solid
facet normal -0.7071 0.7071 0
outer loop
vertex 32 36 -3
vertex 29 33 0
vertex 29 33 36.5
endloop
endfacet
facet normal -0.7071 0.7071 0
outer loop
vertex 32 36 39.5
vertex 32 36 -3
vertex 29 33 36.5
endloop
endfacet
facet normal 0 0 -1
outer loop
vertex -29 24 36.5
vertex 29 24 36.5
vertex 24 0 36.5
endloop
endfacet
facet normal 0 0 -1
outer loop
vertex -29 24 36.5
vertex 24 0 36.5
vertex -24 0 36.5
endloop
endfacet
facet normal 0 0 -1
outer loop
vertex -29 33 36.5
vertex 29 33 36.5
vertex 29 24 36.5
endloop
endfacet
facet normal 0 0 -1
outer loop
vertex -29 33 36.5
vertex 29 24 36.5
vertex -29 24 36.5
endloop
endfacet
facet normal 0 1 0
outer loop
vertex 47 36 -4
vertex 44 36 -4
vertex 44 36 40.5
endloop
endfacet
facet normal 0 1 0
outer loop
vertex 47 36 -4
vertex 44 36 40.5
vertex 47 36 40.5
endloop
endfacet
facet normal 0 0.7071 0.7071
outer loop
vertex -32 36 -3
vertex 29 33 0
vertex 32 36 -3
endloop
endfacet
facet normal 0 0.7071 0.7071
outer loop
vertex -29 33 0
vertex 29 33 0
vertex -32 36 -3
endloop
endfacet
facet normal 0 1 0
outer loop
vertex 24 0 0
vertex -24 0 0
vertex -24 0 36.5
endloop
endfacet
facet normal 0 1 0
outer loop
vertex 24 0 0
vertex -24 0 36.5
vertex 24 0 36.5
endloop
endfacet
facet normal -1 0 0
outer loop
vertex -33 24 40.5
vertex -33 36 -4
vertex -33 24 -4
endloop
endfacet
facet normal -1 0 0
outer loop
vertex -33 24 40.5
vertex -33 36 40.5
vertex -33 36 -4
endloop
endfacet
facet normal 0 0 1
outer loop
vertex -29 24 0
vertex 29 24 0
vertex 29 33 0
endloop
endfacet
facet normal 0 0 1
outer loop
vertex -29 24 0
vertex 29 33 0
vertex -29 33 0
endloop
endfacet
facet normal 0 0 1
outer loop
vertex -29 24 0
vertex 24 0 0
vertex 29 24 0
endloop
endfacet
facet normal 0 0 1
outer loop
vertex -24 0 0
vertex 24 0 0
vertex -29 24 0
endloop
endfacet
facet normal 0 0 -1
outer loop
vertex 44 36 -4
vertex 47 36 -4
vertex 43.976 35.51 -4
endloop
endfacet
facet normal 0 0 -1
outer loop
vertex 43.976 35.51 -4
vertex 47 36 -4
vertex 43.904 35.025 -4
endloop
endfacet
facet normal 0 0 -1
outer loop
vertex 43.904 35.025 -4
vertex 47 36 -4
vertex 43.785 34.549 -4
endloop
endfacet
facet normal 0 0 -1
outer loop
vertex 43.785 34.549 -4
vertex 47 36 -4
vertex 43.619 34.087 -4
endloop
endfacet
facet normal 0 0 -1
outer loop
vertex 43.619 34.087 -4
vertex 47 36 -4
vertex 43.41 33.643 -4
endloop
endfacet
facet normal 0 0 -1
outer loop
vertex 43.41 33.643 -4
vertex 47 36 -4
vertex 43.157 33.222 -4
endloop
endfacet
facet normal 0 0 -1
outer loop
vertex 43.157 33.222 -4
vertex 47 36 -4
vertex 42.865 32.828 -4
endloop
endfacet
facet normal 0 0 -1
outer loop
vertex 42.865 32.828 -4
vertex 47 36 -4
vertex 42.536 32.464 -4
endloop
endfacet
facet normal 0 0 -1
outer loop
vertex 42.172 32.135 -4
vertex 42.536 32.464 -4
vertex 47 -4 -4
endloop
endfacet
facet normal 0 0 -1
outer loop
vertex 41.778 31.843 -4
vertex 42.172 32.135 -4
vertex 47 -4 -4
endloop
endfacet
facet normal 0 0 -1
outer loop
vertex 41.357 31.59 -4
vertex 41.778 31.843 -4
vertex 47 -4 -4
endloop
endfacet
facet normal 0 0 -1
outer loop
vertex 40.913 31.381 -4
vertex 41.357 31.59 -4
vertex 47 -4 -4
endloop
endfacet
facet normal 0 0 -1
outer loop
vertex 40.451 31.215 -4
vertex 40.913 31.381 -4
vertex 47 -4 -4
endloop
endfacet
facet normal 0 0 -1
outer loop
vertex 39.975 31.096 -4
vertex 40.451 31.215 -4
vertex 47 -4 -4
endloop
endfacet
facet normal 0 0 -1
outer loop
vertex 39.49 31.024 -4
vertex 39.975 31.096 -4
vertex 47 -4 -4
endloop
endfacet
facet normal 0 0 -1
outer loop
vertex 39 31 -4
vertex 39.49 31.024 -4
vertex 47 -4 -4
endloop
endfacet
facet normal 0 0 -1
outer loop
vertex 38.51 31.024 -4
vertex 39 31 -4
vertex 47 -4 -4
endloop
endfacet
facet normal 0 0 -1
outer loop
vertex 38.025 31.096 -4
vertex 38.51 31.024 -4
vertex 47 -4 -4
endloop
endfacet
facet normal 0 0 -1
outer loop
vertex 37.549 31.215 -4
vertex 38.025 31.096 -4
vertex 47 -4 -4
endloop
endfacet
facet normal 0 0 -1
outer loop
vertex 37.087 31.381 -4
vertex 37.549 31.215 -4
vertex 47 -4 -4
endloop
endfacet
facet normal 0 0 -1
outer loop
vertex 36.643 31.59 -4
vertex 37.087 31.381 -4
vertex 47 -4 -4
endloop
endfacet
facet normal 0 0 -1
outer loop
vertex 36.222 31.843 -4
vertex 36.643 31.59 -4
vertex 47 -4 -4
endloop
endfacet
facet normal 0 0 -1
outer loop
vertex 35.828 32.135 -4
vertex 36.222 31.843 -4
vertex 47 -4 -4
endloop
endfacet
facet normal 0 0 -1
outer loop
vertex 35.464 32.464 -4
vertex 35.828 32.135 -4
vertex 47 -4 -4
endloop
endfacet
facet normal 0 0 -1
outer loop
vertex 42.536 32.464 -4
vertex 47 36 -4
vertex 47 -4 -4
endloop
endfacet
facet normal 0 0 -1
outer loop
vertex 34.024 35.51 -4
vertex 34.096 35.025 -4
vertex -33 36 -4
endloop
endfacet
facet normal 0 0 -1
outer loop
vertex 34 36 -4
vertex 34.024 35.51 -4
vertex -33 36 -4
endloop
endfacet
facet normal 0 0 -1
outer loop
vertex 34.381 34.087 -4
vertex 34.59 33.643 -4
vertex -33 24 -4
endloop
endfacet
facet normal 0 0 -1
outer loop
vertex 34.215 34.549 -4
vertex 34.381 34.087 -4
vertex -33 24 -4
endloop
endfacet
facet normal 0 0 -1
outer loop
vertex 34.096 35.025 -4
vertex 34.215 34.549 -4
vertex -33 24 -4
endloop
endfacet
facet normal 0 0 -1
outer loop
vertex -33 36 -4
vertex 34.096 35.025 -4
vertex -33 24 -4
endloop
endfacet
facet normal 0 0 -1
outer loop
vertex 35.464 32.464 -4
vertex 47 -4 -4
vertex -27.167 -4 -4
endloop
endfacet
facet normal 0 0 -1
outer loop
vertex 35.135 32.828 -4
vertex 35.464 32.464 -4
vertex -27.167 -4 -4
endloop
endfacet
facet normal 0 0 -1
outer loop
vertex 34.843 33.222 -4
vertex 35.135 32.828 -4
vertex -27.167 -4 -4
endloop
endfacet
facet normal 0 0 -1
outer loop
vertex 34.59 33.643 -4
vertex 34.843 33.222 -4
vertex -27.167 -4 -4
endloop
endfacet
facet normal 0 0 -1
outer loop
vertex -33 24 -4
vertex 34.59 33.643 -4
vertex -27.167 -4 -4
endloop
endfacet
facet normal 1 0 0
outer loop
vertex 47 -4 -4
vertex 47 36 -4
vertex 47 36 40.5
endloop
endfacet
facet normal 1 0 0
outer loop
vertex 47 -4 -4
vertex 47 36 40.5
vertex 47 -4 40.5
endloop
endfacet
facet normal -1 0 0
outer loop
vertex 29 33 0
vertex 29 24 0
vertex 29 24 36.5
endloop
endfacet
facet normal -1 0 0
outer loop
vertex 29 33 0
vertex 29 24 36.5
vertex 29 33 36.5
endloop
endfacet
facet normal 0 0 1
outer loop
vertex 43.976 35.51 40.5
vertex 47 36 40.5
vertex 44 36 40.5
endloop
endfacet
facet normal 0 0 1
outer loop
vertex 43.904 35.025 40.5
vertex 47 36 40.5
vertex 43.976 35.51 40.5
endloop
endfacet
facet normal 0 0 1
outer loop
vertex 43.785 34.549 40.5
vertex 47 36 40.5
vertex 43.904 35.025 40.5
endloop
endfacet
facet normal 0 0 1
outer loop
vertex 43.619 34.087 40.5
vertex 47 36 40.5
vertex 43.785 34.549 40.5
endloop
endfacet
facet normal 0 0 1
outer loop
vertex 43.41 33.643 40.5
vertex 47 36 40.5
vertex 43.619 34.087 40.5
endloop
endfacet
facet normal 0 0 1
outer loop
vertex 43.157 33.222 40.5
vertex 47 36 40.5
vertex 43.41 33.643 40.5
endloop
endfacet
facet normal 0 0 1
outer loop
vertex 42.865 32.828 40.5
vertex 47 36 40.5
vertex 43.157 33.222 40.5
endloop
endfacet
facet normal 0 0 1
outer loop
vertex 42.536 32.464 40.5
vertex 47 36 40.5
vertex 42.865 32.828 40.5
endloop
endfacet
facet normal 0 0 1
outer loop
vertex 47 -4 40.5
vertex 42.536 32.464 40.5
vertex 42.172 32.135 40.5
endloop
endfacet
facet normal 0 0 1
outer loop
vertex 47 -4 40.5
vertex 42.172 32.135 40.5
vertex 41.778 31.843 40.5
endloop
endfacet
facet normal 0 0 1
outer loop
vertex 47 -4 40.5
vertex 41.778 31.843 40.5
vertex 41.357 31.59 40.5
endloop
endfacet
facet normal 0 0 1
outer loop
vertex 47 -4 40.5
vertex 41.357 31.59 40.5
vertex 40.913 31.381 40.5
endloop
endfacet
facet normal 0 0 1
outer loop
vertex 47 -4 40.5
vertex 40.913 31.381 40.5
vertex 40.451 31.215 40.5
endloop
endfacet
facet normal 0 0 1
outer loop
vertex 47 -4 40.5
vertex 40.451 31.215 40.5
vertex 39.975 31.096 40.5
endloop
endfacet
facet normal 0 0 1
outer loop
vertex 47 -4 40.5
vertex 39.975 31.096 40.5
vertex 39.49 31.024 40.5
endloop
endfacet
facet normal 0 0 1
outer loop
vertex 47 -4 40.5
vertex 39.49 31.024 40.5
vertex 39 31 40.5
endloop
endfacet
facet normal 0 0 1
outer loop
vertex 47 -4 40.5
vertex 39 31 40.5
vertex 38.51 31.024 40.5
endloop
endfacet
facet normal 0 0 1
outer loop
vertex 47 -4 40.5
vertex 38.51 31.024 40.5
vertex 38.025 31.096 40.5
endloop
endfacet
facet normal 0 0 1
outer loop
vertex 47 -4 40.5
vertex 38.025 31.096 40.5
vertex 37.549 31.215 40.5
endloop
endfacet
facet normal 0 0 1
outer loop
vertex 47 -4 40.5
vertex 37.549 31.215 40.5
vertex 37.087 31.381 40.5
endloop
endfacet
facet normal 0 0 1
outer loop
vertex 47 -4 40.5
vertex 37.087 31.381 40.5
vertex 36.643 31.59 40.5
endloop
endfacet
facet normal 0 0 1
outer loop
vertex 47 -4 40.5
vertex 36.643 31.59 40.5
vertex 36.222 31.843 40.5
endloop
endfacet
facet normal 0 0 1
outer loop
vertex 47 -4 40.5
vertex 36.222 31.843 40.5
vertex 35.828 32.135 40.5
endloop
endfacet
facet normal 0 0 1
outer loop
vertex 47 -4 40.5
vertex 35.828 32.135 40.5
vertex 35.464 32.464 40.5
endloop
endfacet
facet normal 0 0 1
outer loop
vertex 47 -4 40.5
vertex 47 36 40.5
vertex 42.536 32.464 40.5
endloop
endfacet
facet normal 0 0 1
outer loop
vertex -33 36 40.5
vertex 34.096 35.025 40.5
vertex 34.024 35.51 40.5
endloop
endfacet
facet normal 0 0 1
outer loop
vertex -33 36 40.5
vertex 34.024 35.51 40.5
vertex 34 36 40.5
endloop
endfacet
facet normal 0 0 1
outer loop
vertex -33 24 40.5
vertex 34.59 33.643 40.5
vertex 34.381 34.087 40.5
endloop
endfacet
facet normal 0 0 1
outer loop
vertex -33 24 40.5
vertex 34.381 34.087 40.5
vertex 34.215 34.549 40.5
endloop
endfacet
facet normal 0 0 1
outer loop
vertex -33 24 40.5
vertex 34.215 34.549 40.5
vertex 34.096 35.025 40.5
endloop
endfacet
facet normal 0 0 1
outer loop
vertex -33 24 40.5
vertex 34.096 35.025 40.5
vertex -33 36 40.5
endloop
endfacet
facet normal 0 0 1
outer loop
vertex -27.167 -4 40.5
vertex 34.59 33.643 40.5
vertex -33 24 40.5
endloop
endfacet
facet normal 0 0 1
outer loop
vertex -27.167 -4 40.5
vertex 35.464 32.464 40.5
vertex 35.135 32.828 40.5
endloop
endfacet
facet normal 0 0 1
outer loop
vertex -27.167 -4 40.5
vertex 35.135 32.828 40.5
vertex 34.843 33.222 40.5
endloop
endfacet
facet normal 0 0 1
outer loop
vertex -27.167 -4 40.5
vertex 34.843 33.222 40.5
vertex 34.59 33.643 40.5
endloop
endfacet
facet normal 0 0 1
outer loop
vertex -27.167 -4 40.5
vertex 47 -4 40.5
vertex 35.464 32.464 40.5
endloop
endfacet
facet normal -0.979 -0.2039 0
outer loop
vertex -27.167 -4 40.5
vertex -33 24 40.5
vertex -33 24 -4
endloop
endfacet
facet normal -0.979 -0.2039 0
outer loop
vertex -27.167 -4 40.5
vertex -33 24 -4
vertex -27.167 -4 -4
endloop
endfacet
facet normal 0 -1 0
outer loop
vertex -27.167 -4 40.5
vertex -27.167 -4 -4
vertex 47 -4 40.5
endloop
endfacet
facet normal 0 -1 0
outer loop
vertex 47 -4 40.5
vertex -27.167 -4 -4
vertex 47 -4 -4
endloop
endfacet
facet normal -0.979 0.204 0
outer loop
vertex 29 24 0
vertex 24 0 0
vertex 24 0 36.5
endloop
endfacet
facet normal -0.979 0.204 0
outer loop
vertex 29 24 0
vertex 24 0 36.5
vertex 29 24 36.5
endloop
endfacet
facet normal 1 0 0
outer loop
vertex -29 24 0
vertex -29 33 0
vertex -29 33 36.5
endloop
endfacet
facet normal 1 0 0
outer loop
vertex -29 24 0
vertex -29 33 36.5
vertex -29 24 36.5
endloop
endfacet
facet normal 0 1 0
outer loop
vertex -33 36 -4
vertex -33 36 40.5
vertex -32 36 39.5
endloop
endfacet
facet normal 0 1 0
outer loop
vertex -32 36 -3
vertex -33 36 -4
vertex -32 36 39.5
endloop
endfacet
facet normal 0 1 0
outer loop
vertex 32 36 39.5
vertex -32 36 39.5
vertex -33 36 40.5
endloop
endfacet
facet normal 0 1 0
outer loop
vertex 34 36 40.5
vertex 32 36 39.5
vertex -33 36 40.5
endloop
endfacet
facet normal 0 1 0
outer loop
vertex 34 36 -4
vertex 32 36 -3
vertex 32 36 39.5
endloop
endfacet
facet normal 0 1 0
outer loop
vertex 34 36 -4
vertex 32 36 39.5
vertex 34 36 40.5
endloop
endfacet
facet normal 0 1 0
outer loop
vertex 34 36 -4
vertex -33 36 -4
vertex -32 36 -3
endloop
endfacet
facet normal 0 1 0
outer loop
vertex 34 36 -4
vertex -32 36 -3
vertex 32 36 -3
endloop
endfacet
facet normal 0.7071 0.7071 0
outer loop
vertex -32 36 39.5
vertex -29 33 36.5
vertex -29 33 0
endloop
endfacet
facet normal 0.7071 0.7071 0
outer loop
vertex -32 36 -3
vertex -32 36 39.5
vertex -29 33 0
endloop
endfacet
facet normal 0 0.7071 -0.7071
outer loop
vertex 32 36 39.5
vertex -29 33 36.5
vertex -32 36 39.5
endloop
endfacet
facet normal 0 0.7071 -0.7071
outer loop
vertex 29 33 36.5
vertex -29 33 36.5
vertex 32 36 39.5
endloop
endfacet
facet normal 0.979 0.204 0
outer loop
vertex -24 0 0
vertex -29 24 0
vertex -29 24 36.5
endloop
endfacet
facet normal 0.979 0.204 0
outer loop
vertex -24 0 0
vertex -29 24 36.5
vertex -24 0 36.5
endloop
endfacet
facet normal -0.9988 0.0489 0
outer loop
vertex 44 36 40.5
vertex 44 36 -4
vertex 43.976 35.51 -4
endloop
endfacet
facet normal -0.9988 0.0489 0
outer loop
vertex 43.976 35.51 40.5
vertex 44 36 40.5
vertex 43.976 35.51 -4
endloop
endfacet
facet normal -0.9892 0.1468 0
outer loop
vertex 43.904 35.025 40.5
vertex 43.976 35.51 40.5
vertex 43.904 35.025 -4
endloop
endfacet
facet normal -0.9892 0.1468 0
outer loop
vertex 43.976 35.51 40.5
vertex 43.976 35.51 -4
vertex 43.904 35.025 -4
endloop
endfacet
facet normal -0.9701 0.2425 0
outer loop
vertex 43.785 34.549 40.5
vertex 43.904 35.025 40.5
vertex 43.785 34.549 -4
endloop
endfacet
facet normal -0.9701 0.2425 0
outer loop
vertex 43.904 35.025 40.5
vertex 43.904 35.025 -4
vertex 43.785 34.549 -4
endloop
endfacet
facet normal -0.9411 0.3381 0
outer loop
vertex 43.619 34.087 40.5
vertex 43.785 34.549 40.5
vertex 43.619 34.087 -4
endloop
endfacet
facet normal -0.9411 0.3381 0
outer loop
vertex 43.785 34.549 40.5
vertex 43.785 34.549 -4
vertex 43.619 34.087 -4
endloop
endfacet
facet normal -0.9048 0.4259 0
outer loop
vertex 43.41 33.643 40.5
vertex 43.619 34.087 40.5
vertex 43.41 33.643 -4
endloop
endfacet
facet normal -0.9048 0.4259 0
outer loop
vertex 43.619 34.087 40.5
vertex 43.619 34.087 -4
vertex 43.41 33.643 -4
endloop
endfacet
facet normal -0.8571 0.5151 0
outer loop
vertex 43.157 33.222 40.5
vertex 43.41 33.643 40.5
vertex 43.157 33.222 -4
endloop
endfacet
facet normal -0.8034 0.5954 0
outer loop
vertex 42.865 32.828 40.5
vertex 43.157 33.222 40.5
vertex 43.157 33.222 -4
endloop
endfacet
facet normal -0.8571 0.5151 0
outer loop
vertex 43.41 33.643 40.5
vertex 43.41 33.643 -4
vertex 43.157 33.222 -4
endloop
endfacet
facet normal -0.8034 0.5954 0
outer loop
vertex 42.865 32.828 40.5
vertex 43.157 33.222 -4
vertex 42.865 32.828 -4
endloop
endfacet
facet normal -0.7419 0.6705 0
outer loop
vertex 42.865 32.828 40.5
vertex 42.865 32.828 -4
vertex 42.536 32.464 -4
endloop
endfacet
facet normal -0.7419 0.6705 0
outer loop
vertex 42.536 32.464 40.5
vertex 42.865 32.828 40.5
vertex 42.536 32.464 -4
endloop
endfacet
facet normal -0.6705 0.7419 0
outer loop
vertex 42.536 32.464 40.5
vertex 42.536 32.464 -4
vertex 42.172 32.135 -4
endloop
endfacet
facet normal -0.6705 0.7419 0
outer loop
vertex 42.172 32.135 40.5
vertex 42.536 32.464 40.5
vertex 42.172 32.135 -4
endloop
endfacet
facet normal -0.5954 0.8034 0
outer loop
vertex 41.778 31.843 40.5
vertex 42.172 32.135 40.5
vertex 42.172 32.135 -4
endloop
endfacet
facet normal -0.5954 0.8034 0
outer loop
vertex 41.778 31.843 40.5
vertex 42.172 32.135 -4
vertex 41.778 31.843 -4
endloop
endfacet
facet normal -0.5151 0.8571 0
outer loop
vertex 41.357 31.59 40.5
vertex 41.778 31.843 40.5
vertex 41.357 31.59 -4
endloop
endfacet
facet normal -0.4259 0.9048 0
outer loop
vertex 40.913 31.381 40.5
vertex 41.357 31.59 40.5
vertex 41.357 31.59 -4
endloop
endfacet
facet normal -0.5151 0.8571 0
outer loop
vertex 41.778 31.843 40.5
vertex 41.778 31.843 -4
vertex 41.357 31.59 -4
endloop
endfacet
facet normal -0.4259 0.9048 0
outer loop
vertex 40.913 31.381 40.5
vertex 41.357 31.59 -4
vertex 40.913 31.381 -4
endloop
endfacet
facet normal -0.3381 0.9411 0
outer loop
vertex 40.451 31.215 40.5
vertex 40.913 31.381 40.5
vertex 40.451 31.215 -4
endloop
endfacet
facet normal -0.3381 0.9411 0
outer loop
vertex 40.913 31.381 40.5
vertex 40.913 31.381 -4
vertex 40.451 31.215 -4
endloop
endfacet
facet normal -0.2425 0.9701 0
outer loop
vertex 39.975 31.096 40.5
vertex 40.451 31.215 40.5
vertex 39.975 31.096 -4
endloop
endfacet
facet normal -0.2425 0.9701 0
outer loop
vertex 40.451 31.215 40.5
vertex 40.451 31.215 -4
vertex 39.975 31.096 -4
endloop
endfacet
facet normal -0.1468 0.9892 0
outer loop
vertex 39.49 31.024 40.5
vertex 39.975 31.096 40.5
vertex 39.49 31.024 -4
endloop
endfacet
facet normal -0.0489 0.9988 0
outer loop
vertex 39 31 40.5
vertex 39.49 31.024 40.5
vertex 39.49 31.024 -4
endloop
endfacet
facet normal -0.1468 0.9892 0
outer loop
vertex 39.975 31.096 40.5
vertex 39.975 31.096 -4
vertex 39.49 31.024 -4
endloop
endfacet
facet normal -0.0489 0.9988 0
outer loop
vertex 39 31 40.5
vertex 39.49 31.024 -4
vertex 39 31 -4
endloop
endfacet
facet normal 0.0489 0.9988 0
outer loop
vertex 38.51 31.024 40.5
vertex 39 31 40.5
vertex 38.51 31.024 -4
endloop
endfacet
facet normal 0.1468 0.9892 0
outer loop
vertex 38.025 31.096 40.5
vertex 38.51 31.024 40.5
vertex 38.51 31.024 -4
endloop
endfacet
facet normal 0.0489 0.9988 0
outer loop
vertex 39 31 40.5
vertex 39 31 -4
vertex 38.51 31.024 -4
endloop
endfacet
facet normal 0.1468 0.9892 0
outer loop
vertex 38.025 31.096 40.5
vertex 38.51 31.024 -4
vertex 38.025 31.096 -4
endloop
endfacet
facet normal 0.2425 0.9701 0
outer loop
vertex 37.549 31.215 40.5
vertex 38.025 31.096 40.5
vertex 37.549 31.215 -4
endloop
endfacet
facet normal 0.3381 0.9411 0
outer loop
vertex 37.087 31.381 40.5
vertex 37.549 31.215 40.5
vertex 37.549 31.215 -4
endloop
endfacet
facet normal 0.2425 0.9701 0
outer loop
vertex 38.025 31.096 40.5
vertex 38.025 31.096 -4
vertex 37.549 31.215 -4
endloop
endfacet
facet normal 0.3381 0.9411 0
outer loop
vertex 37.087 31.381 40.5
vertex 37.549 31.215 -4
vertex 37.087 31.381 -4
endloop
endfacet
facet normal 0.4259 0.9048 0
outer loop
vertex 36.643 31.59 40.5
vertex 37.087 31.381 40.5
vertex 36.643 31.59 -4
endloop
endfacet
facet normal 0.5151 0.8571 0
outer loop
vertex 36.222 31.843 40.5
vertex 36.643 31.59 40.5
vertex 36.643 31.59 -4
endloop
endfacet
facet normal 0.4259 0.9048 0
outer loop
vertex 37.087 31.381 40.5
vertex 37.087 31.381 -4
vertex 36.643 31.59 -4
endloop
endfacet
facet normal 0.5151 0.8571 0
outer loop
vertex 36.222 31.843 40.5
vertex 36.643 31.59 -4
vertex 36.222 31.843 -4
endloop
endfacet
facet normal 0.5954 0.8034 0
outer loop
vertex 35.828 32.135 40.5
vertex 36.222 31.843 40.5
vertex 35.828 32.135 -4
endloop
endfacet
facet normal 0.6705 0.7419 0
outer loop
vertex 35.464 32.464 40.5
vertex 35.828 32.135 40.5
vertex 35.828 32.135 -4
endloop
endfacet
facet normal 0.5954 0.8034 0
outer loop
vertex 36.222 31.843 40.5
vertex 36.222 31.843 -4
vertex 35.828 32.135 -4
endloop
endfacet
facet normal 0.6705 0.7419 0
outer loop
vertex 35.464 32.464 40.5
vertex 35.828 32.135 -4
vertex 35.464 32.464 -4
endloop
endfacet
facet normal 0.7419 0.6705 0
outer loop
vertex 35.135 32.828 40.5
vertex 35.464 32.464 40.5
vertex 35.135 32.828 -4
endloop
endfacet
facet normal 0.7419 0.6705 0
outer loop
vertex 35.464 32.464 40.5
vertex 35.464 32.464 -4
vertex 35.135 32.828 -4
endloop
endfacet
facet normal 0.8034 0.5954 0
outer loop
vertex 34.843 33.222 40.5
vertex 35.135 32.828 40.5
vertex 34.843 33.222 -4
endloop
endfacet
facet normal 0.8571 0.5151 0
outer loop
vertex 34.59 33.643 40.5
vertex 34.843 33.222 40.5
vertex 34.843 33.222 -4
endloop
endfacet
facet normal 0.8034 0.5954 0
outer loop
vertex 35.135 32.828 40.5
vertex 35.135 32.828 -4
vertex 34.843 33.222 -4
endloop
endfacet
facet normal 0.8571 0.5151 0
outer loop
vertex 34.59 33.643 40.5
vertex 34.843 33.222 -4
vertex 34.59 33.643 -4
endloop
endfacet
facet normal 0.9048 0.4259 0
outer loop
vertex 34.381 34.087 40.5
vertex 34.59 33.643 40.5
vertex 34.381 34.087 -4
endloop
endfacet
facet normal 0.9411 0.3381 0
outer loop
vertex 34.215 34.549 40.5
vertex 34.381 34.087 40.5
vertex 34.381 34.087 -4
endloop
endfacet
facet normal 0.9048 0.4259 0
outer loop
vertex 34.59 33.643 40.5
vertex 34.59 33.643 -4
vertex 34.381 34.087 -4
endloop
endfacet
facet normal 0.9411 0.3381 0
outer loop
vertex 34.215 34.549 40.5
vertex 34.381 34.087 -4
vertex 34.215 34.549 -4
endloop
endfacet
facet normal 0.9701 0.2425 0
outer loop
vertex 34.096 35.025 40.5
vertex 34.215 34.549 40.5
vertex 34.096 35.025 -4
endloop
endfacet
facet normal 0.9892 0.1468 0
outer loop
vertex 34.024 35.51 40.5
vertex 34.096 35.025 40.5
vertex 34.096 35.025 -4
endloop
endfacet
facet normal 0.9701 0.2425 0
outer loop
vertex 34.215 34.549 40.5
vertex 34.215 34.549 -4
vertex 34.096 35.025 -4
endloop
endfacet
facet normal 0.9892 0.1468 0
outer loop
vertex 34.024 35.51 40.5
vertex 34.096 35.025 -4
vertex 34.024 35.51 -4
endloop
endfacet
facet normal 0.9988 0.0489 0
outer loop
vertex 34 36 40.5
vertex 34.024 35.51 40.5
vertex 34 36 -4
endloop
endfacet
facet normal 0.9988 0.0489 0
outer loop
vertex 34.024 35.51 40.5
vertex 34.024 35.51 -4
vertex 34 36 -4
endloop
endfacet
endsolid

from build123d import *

# Parameters (mm, degrees)
EXTRUDE001_DEPTH = 4
EXTRUDE002_DEPTH = 4
EXTRUDE003_DEPTH = 44.5
EXTRUDE_DEPTH    = 36.5
CHAMFER_SIZE     = 3
CHAMFER001_SIZE  = 3
CHAMFER002_SIZE  = 3
CHAMFER003_SIZE  = 3


with BuildPart() as extrude001:
    # Sketch001 (on Face14 of Extrude) → Extrude001 (new body)
    with BuildSketch(Plane.XY.offset(36.5)):
        Polygon((-33, 36), (33, 36), (33, 24), (27.166667, -4), (-27.166667, -4), (-33, 24), align=None)
    extrude(amount=EXTRUDE001_DEPTH)


with BuildPart() as extrude002:
    # Sketch002 (on Face13 of Extrude) → Extrude002 (new body)
    with BuildSketch(Plane(origin=(0, 0, 0), x_dir=(1, 0, 0), z_dir=(0, 0, -1))):
        Polygon((-33, -36), (-33, -24), (-27.166667, 4), (27.166667, 4), (33, -24), (33, -36), align=None)
    extrude(amount=EXTRUDE002_DEPTH)


with BuildPart() as extrude003:
    # Sketch003 (on Face8 of Extrude002) → Extrude003 (new body)
    with BuildSketch(Plane(origin=(0, 0, -4), x_dir=(1, 0, 0), z_dir=(0, 0, -1))):
        with BuildLine():
            Line((27.166667, 4), (47, 4))
            Line((47, -36), (47, 4))
            Line((44, -36), (47, -36))
            ThreePointArc((44, -36), (39, -31), (34, -36))
            Line((33, -36), (34, -36))
            Line((33, -24), (33, -36))
            Line((27.166667, 4), (33, -24))
        make_face()
    extrude(amount=-EXTRUDE003_DEPTH)


with BuildPart() as chamfer003:
    # Sketch → Extrude (new body)
    with BuildSketch(Plane.XY):
        Polygon((-24, 0), (24, 0), (29, 24), (29, 36), (33, 36), (33, 24), (27.166667, -4), (-27.166667, -4), (-33, 24), (-33, 36), (-29, 36), (-29, 24), align=None)
    extrude(amount=EXTRUDE_DEPTH)

    # Fusion: union Extrude001, Extrude002, Extrude003
    add(extrude001.part)
    add(extrude002.part)
    add(extrude003.part)

    # Chamfer
    chamfer_edges = [chamfer003.edges().sort_by_distance(p)[0] for p in [
        (0, 36, 36.5),
    ]]
    chamfer(chamfer_edges, length=CHAMFER_SIZE)

    # Chamfer001
    chamfer001_edges = [chamfer003.edges().sort_by_distance(p)[0] for p in [
        (0, 36, 0),
    ]]
    chamfer(chamfer001_edges, length=CHAMFER001_SIZE)

    # Chamfer002
    chamfer002_edges = [chamfer003.edges().sort_by_distance(p)[0] for p in [
        (29, 36, 38),
        (29, 36, 18.25),
        (29, 36, -1.5),
    ]]
    chamfer(chamfer002_edges, length=CHAMFER002_SIZE)

    # Chamfer003
    chamfer003_edges = [chamfer003.edges().sort_by_distance(p)[0] for p in [
        (-29, 36, 38),
        (-29, 36, 18.25),
        (-29, 36, -1.5),
    ]]
    chamfer(chamfer003_edges, length=CHAMFER003_SIZE)


solid = chamfer003.part
